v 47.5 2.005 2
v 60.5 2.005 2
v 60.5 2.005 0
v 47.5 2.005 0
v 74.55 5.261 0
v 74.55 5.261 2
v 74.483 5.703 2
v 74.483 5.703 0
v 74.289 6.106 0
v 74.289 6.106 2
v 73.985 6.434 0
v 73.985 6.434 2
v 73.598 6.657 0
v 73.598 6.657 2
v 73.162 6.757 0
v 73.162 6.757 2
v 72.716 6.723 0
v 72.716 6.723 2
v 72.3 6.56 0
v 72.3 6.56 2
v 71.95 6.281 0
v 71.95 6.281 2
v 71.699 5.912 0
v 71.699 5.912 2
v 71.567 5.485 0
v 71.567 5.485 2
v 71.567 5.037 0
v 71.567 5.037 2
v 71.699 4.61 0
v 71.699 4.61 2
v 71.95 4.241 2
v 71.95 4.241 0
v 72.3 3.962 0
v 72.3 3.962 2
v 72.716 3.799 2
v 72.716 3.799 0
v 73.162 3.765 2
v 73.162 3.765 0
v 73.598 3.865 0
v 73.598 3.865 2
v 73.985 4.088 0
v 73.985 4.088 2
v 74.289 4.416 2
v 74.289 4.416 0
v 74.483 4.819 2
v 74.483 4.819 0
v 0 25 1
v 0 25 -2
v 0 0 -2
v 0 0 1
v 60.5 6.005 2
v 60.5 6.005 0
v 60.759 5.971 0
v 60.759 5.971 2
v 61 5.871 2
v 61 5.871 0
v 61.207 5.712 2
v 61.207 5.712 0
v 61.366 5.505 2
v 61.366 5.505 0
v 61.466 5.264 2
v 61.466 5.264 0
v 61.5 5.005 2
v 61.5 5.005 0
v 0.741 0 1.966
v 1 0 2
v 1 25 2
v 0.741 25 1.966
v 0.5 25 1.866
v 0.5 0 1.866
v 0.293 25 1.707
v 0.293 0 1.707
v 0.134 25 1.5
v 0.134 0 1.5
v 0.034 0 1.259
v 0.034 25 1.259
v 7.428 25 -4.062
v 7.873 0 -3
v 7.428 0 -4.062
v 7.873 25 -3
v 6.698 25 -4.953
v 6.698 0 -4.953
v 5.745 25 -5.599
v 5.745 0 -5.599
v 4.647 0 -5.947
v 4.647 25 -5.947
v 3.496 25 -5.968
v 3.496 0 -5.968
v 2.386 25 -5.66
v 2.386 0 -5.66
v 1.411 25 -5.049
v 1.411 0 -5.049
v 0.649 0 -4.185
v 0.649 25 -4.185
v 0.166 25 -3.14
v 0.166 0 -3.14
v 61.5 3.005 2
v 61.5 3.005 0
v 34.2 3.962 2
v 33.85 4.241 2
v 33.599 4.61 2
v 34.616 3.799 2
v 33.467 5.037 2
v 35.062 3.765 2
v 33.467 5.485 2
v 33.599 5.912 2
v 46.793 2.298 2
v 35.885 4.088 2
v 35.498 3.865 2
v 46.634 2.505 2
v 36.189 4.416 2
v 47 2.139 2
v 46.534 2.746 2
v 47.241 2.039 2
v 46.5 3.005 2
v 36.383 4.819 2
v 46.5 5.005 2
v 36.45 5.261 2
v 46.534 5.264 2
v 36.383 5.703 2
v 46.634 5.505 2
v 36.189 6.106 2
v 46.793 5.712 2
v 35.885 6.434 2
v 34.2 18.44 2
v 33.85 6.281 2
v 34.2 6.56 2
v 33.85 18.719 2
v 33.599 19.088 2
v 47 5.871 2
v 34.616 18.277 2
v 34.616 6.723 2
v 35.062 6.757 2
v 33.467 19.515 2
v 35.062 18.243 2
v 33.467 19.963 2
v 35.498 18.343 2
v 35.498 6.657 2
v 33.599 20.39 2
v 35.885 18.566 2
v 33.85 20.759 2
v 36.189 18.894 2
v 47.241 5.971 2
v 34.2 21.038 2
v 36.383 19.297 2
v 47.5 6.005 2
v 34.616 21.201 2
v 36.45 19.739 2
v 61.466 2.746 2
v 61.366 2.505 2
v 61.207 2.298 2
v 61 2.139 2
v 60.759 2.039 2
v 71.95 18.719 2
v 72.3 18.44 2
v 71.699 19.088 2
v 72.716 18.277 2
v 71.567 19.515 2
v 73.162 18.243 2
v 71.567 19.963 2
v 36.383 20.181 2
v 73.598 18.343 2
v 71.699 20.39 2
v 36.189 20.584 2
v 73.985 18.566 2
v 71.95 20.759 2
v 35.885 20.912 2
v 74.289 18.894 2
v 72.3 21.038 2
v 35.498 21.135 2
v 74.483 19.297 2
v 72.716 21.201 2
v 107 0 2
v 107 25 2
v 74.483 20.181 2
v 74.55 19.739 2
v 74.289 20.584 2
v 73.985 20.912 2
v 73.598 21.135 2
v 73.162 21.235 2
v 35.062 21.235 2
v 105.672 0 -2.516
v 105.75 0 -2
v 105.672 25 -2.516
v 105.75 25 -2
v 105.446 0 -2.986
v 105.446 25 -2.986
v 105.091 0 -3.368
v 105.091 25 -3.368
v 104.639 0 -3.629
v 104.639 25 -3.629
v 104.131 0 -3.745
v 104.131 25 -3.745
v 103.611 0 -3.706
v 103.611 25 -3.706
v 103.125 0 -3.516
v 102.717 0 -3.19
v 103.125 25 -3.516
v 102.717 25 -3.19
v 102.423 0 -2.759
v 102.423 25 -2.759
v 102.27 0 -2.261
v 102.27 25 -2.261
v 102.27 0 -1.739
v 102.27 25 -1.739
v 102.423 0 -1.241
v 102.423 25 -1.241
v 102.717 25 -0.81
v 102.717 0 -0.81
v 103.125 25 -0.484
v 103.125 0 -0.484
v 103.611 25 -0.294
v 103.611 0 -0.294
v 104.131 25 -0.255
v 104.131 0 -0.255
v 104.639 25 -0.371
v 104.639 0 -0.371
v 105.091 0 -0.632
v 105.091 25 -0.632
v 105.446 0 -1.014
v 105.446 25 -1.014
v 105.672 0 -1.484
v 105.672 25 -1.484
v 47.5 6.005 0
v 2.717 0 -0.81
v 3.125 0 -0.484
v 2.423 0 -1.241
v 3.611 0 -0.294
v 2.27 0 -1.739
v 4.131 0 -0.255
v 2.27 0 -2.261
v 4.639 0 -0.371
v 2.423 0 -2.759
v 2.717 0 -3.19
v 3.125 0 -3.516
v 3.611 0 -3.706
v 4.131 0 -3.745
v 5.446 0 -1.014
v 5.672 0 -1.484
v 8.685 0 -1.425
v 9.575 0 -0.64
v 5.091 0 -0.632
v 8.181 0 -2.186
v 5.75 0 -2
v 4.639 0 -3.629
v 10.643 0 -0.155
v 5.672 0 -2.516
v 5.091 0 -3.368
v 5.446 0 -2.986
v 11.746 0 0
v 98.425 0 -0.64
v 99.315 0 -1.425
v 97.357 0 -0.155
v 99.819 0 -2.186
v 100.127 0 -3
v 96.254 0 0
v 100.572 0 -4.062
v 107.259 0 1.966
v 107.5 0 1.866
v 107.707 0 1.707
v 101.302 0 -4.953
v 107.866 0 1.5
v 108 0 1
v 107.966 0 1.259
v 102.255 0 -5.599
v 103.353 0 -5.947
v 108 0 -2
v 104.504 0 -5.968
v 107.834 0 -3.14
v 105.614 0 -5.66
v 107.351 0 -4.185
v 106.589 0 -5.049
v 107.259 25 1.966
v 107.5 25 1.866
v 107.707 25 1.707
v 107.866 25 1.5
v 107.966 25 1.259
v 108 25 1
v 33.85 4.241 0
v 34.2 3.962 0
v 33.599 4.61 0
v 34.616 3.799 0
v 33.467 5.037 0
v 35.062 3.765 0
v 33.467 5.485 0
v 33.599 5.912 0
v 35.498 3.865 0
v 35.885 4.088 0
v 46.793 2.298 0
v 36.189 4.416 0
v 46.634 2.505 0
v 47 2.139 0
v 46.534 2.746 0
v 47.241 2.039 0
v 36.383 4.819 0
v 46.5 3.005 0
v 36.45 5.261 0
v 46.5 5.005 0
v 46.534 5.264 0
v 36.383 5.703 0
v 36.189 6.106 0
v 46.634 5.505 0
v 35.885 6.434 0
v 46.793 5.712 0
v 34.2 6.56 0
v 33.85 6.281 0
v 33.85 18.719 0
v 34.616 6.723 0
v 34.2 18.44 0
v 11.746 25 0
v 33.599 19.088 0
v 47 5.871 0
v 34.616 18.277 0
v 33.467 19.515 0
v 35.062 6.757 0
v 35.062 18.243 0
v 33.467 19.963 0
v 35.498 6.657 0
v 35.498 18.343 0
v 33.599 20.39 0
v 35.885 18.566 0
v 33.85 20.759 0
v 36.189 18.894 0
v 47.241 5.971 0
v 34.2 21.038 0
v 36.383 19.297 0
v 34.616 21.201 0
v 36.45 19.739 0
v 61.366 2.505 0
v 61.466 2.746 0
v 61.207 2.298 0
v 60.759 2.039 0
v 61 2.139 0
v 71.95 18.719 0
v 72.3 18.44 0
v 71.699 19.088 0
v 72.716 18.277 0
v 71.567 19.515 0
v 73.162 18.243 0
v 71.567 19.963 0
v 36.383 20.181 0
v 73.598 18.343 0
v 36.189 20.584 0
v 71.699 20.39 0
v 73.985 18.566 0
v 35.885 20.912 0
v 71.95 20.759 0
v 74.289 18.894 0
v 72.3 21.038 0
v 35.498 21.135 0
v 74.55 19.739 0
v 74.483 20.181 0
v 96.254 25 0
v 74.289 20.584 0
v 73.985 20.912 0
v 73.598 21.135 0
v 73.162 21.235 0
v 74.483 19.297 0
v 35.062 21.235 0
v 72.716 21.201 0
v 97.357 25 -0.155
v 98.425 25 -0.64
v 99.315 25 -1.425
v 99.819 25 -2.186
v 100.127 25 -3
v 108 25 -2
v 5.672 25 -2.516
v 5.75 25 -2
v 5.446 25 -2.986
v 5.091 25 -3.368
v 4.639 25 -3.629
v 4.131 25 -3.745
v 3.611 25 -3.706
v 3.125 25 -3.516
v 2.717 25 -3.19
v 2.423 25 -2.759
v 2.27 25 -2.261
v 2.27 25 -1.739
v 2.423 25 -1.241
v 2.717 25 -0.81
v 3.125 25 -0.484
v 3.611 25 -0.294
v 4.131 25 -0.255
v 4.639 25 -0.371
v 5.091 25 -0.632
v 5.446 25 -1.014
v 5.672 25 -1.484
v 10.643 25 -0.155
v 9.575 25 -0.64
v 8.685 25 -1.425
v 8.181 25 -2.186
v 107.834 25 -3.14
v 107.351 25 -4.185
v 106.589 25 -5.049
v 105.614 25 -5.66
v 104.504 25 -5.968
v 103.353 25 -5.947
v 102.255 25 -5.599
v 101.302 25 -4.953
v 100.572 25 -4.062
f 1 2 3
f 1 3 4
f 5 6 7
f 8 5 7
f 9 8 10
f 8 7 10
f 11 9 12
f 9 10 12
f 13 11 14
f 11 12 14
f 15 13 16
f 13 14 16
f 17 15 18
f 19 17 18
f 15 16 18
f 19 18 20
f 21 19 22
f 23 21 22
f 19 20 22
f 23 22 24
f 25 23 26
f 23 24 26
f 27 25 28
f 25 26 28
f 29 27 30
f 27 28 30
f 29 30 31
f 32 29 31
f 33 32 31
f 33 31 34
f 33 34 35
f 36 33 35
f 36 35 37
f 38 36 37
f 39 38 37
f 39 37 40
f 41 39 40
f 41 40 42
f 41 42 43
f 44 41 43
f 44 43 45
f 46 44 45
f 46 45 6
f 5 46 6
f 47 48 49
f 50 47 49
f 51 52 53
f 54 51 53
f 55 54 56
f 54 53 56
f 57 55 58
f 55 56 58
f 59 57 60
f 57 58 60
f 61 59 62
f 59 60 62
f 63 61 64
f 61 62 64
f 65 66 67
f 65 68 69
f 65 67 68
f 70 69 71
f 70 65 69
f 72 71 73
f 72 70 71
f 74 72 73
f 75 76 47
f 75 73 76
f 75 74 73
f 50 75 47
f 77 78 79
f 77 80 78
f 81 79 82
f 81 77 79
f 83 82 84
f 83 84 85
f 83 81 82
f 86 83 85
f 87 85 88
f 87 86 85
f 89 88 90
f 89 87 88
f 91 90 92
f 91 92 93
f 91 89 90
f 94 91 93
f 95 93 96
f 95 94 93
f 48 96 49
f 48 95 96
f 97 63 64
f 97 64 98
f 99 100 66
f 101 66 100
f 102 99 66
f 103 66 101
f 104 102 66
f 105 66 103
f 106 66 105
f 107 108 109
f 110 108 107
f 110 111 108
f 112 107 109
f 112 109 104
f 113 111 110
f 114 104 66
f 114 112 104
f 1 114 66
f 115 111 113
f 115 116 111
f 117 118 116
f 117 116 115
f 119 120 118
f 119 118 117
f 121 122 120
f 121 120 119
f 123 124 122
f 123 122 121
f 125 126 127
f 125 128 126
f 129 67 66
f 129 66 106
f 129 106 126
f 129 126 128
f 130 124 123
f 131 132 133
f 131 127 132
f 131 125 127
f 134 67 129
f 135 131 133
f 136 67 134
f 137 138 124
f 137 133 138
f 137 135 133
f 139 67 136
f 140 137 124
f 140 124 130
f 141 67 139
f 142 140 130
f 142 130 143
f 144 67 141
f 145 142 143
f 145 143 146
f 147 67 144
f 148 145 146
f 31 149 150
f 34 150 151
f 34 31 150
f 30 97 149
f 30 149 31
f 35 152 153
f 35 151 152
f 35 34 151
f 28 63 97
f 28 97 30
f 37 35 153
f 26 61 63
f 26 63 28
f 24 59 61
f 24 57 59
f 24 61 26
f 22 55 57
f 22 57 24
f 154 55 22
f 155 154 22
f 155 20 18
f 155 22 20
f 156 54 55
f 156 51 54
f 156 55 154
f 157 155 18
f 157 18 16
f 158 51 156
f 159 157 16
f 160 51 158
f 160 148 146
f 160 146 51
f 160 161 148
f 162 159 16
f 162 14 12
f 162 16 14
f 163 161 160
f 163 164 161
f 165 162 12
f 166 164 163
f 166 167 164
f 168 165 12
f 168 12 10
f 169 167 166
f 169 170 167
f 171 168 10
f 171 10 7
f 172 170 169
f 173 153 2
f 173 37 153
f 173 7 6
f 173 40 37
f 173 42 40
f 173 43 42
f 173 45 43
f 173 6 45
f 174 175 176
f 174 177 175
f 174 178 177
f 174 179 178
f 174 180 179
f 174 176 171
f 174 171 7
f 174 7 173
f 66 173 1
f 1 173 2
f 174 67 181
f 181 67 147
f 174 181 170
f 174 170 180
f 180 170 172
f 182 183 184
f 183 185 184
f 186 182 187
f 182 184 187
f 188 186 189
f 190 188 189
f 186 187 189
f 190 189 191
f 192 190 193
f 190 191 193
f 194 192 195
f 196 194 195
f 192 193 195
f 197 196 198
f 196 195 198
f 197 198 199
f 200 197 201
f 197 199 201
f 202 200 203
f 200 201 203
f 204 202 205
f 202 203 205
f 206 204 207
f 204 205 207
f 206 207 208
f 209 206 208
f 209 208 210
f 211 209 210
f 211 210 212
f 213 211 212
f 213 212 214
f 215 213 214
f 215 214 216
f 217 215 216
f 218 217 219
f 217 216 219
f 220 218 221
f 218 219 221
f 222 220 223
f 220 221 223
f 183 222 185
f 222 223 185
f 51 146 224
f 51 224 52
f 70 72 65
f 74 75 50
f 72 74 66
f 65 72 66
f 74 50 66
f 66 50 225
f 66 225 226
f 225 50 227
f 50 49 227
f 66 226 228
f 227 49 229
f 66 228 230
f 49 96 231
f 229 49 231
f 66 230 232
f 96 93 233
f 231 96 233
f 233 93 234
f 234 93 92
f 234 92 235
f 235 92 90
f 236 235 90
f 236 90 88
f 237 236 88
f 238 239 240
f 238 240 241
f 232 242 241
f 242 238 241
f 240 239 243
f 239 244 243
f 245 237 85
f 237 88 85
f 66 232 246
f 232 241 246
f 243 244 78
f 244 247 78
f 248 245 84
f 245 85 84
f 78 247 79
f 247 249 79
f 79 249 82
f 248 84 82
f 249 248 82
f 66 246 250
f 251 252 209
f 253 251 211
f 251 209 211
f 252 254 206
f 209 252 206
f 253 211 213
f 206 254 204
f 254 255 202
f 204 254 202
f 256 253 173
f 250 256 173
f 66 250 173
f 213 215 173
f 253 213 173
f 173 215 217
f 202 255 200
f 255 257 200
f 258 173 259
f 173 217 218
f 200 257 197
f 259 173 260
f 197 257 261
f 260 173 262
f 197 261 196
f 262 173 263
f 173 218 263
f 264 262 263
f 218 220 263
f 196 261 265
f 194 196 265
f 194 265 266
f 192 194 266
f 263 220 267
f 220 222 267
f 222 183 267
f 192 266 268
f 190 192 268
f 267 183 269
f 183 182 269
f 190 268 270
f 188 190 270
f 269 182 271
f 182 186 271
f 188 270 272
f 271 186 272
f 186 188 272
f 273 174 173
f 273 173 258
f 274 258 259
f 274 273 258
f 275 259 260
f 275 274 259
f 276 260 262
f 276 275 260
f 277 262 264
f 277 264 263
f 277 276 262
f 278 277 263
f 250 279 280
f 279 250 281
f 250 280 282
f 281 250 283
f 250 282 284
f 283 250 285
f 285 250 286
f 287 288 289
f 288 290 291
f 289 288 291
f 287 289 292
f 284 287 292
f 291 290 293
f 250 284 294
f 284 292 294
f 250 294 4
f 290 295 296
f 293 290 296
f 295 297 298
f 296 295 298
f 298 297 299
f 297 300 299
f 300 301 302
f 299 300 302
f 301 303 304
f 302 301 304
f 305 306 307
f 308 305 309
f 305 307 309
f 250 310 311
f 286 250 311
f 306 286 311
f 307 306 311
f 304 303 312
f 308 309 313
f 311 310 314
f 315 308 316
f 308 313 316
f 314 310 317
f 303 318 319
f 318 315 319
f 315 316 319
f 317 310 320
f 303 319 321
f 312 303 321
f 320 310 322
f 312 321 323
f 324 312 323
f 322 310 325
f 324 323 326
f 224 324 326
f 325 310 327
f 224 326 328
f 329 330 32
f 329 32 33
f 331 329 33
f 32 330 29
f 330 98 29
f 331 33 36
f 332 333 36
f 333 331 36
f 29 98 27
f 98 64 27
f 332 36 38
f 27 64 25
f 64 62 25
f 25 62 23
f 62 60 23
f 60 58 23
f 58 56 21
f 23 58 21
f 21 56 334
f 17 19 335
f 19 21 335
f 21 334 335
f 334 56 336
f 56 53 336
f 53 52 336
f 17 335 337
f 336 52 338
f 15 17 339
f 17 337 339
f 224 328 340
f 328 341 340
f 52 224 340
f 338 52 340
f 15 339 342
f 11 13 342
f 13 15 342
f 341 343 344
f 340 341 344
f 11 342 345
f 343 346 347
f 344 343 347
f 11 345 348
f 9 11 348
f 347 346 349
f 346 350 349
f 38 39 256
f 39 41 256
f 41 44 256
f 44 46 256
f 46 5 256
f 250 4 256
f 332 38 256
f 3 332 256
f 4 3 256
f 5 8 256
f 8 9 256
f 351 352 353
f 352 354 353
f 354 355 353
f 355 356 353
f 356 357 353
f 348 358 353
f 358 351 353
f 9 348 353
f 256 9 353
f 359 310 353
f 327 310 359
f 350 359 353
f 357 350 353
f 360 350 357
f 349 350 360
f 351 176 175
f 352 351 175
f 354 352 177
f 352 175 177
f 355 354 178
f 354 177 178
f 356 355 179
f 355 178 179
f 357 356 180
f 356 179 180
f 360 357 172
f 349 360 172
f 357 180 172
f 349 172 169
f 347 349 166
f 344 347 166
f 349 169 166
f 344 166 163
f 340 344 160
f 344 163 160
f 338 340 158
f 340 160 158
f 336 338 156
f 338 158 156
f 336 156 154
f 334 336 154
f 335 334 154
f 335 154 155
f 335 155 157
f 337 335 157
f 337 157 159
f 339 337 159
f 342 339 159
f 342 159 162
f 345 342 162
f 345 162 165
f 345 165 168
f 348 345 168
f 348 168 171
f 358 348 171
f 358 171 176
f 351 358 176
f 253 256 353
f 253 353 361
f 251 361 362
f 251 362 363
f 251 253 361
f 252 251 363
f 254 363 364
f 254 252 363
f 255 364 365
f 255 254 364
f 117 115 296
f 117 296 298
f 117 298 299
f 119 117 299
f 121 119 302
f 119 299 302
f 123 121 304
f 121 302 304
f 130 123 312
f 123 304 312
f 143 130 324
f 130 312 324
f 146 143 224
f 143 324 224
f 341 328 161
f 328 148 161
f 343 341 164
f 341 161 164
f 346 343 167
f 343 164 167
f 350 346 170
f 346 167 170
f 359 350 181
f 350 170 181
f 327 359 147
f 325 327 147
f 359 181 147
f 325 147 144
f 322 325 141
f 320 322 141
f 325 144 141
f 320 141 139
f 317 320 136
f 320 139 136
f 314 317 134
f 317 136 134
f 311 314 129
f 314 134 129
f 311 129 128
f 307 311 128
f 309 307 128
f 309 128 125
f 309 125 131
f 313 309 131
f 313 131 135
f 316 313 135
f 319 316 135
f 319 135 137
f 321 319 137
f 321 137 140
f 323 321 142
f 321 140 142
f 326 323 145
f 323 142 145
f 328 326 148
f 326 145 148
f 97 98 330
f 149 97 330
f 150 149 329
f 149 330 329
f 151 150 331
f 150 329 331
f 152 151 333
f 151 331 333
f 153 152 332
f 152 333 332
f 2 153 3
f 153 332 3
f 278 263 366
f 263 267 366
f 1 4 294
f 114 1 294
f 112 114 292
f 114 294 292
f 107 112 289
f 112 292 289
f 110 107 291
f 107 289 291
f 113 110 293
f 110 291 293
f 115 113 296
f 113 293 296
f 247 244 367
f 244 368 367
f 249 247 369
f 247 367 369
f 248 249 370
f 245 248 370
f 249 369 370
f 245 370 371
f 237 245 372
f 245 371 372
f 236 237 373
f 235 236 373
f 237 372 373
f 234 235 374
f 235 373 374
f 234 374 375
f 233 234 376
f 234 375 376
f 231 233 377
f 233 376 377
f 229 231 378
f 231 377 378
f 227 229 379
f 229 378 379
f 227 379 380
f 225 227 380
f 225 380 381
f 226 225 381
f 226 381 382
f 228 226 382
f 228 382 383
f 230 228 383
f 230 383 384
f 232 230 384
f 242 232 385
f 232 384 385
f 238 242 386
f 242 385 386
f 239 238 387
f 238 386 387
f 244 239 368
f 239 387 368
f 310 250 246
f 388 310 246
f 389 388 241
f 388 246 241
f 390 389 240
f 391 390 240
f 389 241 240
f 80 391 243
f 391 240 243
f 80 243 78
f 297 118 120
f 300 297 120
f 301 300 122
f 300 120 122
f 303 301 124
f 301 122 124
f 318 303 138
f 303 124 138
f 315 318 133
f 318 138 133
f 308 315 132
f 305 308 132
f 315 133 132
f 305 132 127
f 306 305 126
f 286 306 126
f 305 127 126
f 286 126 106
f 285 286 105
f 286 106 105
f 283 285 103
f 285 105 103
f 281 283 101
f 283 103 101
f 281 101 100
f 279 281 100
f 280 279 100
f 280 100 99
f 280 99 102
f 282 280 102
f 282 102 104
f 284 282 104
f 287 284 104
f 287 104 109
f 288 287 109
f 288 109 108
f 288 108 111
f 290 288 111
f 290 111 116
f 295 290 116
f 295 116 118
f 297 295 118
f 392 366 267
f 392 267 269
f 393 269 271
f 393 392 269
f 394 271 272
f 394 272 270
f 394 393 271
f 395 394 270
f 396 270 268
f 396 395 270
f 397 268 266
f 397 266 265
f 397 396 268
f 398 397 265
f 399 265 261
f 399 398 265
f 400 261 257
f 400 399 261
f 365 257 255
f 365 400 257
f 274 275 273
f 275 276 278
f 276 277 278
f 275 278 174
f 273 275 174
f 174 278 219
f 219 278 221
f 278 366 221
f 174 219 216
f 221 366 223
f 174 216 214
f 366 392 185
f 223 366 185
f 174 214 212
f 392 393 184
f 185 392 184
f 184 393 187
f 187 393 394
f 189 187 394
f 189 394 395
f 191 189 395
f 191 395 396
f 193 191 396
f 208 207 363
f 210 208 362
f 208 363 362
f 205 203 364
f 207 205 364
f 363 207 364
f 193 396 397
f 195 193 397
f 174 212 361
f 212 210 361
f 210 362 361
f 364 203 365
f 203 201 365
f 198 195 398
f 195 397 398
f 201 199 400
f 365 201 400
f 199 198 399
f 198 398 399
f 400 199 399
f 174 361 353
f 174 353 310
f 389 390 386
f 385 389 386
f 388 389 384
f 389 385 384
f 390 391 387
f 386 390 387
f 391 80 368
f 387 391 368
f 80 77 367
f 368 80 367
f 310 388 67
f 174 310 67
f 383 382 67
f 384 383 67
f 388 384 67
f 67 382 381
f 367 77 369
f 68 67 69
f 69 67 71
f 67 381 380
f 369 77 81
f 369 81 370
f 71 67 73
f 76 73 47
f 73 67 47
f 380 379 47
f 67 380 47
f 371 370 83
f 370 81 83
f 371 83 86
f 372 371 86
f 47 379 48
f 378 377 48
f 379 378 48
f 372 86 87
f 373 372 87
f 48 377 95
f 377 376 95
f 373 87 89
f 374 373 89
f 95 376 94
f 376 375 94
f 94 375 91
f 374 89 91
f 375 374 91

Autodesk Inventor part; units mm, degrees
ref_plane "YZ Plane" through (0, 0, 0) normal (1, 0, 0) x (0, 1, 0)
ref_plane "XZ Plane" through (0, 0, 0) normal (0, 1, 0) x (-1, 0, 0)
ref_plane "XY Plane" through (0, 0, 0) normal (0, 0, 1) x (1, 0, 0)
sketch "Skizze1" plane through (0, 0, 0) normal (0, 0, 1) x (1, 0, 0)
  line L0 (0, 0) -> (108, 0)
  line L1 (108, 0) -> (108, 25)
  line L2 (108, 25) -> (0, 25)
  line L3 (0, 25) -> (0, 0)
  dimension "d5" = 108
  dimension "d6" = 25
extrude "Extrusion1" add sketch "Skizze1" along normal blind 2
sketch "Skizze3" plane through (0, 25, 0) normal (0, 1, 0) x (1, 0, 0)
  circle A0 centre (4, 2) radius 1.75
  circle A1 centre (104, 2) radius 1.75
  line L0 (4, 2) -> (104, 2) construction
  line L1 (0, 0) -> (108, 0) construction
  line L2 (54, 0) -> (54, 2) construction
  line L3 (0, 0) -> (8, 0)
  line L4 (108, 0) -> (100, 0)
  line L5 (0, 0) -> (0, 2)
  line L6 (8, 2) -> (8, 0)
  line L7 (100, 2) -> (100, 0)
  line L8 (108, 0) -> (108, 2)
  arc A2 (8, 2) -> (0, 2) centre (4, 2) ccw
  arc A3 (108, 2) -> (100, 2) centre (104, 2) ccw
  dimension "d2" = 100
  dimension "d3" = 3.5
  dimension "d4" = 2
extrude "Extrusion2" add sketch "Skizze3" against normal up to surface (25 mm away)
sketch "Skizze4" plane through (0, 0, 2) normal (0, 0, 1) x (1, 0, 0)
  line L0 (34.95, 5.261) -> (73.05, 5.261) construction
  line L1 (73.05, 5.261) -> (73.05, 19.739) construction
  line L2 (73.05, 19.739) -> (34.95, 19.739) construction
  line L3 (34.95, 19.739) -> (34.95, 5.261) construction
  line L4 (108, 25) -> (0, 25) construction
  line L5 (54, 25) -> (54, 0) construction
  line L6 (0, 0) -> (108, 0) construction
  line L7 (0, 25) -> (0, 0) construction
  line L8 (0, 12.5) -> (108, 12.5) construction
  line L9 (108, 0) -> (108, 25) construction
  circle A0 centre (73.05, 19.739) radius 1.5
  circle A1 centre (34.95, 5.261) radius 1.5
  circle A2 centre (34.95, 19.739) radius 1.5
  circle A3 centre (73.05, 5.261) radius 1.5
  point P0 (54, 19.739)
  point P1 (73.05, 12.5)
  dimension "d12" = 38.1
  dimension "d13" = 14.478
  dimension "d14" = 3
extrude "Extrusion3" cut sketch "Skizze4" against normal blind 8
sketch "Skizze5" plane through (0, 0, 2) normal (0, 0, 1) x (1, 0, 0)
  line L0 (44.09, 22.4949) -> (0.91, 22.4949) construction
  line L1 (0.91, 22.4949) -> (0.91, 2.5051) construction
  line L2 (0.91, 2.5051) -> (44.09, 2.5051) construction
  line L3 (44.09, 2.5051) -> (44.09, 22.4949) construction
  line L4 (108, 25) -> (0, 25) construction
  line L5 (54, 25) -> (54, 0) construction
  line L6 (0, 0) -> (108, 0) construction
  line L7 (108, 0) -> (108, 25) construction
  line L8 (108, 12.5) -> (0, 12.5) construction
  line L9 (0, 25) -> (0, 0) construction
  line L10 (46.5, 6.0051) -> (61.5, 6.0051)
  line L11 (61.5, 6.0051) -> (61.5, 2.0051)
  line L12 (61.5, 2.0051) -> (46.5, 2.0051)
  line L13 (46.5, 2.0051) -> (46.5, 6.0051)
  point P0 (0.91, 12.5)
  point P1 (54, 6.0051)
  dimension "d17" = 43.18
  dimension "d18" = 19.9898
  dimension "d19" = 15
  dimension "d20" = 4
  dimension "d27" = 0.5
extrude "Extrusion4" cut sketch "Skizze5" against normal up to next
fillet "Rundung1" radius 1 4 edges at (46.5, 6.0051, 1) (61.5, 6.0051, 1) (61.5, 2.0051, 1) (46.5, 2.0051, 1)
fillet "Rundung2" radius 4 2 edges at (8, 12.5, 0) (100, 12.5, 0)
fillet "Rundung3" radius 1 2 edges at (0, 12.5, 2) (108, 12.5, 2)
properties part number "US Halterung hinten leicht" material "ABS-Kunststoff"
